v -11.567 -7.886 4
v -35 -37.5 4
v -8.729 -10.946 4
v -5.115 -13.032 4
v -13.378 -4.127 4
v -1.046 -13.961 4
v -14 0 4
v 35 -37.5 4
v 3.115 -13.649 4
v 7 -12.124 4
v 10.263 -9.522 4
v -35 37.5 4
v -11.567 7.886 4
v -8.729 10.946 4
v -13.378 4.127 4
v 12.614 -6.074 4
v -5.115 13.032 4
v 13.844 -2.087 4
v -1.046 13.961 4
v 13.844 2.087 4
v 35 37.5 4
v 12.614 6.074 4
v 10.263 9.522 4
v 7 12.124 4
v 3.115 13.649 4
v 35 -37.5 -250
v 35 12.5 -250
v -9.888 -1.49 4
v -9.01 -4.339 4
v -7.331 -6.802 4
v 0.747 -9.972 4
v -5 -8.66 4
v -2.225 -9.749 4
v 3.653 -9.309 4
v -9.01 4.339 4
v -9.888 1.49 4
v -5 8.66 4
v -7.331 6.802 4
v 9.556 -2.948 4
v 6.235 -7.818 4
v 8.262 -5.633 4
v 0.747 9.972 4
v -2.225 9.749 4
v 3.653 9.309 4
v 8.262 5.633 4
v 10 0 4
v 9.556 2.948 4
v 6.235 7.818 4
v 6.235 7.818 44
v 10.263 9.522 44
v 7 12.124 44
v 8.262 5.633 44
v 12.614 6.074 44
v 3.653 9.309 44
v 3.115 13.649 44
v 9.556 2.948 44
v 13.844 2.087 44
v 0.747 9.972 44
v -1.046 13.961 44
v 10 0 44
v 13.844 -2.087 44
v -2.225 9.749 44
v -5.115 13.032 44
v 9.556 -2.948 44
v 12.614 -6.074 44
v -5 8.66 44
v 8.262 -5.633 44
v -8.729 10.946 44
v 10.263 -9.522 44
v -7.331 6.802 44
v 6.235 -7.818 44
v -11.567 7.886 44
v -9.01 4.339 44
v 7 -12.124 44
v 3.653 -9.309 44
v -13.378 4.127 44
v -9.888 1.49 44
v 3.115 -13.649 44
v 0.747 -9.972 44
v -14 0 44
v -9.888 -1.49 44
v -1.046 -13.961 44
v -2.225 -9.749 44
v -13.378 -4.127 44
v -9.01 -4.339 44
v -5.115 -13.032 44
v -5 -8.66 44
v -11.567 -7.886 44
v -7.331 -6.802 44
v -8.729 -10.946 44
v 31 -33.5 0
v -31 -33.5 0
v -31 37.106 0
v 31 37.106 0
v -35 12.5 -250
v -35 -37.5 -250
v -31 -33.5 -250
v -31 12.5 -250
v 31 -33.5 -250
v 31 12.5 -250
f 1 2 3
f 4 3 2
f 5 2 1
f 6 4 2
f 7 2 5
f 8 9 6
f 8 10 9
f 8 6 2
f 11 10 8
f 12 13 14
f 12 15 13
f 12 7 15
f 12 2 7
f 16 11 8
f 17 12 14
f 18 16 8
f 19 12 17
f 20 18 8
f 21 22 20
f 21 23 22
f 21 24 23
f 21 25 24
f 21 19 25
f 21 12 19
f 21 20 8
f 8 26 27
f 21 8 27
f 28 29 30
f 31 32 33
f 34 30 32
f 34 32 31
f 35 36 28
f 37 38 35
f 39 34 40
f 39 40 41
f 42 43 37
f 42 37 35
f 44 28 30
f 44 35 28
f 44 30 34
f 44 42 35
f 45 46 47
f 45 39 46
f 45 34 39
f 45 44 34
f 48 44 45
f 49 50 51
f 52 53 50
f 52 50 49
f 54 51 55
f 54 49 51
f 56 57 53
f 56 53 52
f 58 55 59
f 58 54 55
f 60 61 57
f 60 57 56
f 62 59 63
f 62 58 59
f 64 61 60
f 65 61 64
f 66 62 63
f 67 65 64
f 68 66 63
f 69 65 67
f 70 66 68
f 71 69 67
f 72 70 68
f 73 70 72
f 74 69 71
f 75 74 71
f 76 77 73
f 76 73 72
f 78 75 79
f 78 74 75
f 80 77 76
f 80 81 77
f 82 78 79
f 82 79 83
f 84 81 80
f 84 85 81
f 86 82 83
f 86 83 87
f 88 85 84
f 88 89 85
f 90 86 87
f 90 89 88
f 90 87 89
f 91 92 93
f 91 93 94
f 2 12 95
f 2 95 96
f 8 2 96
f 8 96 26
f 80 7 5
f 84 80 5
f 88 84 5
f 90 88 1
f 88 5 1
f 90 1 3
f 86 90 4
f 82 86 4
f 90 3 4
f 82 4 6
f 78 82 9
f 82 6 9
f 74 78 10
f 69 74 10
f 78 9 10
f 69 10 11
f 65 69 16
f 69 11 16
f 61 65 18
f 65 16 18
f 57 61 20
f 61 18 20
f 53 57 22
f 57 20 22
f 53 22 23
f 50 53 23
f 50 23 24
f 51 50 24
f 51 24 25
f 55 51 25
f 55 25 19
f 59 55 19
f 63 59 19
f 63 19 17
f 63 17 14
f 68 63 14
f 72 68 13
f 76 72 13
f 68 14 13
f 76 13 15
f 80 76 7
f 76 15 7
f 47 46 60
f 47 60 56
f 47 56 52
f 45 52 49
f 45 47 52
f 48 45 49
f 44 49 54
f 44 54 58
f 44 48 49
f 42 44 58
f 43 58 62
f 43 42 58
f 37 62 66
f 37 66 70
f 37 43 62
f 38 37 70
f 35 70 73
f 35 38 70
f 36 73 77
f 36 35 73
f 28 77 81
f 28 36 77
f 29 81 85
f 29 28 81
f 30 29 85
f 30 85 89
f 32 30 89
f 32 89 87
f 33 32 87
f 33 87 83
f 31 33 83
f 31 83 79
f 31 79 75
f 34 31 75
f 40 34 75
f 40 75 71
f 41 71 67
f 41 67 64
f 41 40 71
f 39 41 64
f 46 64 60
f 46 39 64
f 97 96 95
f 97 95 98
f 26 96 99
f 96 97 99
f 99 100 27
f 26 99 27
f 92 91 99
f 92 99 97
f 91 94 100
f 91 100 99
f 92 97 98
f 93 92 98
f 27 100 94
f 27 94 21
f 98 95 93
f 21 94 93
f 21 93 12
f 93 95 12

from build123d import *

# Parameters (mm, degrees)
SKETCH_1_W          = 70
SKETCH_1_H          = 75
EXTRUDE_1_DEPTH     = 4
EXTRUDE_2_DEPTH     = 250
CUT_EXTRUDE_1_DEPTH = 263.309454652
SKETCH_4_R          = 14
SKETCH_4_R_2        = 10
EXTRUDE_3_DEPTH     = 40


with BuildPart() as part:
    # 草图1 → 凸台-拉伸1 (new body)
    with BuildSketch(Plane.XY):
        Rectangle(SKETCH_1_W, SKETCH_1_H)
    extrude(amount=EXTRUDE_1_DEPTH)

    # 草图2 → 凸台-拉伸2 (add)
    with BuildSketch(Plane(origin=(0, 0, 0), x_dir=(-1, 0, 0), z_dir=(0, 0, -1))):
        Polygon((35, 37.5), (35, -37.5), (-35, -37.5), (-35, 37.5), (-31, 37.5), (-31, -33.5), (31, -33.5), (31, 37.5), align=None)
    extrude(amount=EXTRUDE_2_DEPTH)

    # 草图3 → 切除-拉伸1 (cut, through all)
    with BuildSketch(Plane.ZY.offset(35)):
        Polygon((4, 37.5), (-250, 37.5), (-250, 12.5), align=None)
    extrude(amount=-CUT_EXTRUDE_1_DEPTH, mode=Mode.SUBTRACT)

    # 草图4 → 凸台-拉伸3 (add)
    with BuildSketch(Plane.XY.offset(4)):
        with Locations(Location((0, 0, 0), (0, 0, 180))):
            Circle(SKETCH_4_R)
        Circle(SKETCH_4_R_2, mode=Mode.SUBTRACT)
    extrude(amount=EXTRUDE_3_DEPTH)


solid = part.part
